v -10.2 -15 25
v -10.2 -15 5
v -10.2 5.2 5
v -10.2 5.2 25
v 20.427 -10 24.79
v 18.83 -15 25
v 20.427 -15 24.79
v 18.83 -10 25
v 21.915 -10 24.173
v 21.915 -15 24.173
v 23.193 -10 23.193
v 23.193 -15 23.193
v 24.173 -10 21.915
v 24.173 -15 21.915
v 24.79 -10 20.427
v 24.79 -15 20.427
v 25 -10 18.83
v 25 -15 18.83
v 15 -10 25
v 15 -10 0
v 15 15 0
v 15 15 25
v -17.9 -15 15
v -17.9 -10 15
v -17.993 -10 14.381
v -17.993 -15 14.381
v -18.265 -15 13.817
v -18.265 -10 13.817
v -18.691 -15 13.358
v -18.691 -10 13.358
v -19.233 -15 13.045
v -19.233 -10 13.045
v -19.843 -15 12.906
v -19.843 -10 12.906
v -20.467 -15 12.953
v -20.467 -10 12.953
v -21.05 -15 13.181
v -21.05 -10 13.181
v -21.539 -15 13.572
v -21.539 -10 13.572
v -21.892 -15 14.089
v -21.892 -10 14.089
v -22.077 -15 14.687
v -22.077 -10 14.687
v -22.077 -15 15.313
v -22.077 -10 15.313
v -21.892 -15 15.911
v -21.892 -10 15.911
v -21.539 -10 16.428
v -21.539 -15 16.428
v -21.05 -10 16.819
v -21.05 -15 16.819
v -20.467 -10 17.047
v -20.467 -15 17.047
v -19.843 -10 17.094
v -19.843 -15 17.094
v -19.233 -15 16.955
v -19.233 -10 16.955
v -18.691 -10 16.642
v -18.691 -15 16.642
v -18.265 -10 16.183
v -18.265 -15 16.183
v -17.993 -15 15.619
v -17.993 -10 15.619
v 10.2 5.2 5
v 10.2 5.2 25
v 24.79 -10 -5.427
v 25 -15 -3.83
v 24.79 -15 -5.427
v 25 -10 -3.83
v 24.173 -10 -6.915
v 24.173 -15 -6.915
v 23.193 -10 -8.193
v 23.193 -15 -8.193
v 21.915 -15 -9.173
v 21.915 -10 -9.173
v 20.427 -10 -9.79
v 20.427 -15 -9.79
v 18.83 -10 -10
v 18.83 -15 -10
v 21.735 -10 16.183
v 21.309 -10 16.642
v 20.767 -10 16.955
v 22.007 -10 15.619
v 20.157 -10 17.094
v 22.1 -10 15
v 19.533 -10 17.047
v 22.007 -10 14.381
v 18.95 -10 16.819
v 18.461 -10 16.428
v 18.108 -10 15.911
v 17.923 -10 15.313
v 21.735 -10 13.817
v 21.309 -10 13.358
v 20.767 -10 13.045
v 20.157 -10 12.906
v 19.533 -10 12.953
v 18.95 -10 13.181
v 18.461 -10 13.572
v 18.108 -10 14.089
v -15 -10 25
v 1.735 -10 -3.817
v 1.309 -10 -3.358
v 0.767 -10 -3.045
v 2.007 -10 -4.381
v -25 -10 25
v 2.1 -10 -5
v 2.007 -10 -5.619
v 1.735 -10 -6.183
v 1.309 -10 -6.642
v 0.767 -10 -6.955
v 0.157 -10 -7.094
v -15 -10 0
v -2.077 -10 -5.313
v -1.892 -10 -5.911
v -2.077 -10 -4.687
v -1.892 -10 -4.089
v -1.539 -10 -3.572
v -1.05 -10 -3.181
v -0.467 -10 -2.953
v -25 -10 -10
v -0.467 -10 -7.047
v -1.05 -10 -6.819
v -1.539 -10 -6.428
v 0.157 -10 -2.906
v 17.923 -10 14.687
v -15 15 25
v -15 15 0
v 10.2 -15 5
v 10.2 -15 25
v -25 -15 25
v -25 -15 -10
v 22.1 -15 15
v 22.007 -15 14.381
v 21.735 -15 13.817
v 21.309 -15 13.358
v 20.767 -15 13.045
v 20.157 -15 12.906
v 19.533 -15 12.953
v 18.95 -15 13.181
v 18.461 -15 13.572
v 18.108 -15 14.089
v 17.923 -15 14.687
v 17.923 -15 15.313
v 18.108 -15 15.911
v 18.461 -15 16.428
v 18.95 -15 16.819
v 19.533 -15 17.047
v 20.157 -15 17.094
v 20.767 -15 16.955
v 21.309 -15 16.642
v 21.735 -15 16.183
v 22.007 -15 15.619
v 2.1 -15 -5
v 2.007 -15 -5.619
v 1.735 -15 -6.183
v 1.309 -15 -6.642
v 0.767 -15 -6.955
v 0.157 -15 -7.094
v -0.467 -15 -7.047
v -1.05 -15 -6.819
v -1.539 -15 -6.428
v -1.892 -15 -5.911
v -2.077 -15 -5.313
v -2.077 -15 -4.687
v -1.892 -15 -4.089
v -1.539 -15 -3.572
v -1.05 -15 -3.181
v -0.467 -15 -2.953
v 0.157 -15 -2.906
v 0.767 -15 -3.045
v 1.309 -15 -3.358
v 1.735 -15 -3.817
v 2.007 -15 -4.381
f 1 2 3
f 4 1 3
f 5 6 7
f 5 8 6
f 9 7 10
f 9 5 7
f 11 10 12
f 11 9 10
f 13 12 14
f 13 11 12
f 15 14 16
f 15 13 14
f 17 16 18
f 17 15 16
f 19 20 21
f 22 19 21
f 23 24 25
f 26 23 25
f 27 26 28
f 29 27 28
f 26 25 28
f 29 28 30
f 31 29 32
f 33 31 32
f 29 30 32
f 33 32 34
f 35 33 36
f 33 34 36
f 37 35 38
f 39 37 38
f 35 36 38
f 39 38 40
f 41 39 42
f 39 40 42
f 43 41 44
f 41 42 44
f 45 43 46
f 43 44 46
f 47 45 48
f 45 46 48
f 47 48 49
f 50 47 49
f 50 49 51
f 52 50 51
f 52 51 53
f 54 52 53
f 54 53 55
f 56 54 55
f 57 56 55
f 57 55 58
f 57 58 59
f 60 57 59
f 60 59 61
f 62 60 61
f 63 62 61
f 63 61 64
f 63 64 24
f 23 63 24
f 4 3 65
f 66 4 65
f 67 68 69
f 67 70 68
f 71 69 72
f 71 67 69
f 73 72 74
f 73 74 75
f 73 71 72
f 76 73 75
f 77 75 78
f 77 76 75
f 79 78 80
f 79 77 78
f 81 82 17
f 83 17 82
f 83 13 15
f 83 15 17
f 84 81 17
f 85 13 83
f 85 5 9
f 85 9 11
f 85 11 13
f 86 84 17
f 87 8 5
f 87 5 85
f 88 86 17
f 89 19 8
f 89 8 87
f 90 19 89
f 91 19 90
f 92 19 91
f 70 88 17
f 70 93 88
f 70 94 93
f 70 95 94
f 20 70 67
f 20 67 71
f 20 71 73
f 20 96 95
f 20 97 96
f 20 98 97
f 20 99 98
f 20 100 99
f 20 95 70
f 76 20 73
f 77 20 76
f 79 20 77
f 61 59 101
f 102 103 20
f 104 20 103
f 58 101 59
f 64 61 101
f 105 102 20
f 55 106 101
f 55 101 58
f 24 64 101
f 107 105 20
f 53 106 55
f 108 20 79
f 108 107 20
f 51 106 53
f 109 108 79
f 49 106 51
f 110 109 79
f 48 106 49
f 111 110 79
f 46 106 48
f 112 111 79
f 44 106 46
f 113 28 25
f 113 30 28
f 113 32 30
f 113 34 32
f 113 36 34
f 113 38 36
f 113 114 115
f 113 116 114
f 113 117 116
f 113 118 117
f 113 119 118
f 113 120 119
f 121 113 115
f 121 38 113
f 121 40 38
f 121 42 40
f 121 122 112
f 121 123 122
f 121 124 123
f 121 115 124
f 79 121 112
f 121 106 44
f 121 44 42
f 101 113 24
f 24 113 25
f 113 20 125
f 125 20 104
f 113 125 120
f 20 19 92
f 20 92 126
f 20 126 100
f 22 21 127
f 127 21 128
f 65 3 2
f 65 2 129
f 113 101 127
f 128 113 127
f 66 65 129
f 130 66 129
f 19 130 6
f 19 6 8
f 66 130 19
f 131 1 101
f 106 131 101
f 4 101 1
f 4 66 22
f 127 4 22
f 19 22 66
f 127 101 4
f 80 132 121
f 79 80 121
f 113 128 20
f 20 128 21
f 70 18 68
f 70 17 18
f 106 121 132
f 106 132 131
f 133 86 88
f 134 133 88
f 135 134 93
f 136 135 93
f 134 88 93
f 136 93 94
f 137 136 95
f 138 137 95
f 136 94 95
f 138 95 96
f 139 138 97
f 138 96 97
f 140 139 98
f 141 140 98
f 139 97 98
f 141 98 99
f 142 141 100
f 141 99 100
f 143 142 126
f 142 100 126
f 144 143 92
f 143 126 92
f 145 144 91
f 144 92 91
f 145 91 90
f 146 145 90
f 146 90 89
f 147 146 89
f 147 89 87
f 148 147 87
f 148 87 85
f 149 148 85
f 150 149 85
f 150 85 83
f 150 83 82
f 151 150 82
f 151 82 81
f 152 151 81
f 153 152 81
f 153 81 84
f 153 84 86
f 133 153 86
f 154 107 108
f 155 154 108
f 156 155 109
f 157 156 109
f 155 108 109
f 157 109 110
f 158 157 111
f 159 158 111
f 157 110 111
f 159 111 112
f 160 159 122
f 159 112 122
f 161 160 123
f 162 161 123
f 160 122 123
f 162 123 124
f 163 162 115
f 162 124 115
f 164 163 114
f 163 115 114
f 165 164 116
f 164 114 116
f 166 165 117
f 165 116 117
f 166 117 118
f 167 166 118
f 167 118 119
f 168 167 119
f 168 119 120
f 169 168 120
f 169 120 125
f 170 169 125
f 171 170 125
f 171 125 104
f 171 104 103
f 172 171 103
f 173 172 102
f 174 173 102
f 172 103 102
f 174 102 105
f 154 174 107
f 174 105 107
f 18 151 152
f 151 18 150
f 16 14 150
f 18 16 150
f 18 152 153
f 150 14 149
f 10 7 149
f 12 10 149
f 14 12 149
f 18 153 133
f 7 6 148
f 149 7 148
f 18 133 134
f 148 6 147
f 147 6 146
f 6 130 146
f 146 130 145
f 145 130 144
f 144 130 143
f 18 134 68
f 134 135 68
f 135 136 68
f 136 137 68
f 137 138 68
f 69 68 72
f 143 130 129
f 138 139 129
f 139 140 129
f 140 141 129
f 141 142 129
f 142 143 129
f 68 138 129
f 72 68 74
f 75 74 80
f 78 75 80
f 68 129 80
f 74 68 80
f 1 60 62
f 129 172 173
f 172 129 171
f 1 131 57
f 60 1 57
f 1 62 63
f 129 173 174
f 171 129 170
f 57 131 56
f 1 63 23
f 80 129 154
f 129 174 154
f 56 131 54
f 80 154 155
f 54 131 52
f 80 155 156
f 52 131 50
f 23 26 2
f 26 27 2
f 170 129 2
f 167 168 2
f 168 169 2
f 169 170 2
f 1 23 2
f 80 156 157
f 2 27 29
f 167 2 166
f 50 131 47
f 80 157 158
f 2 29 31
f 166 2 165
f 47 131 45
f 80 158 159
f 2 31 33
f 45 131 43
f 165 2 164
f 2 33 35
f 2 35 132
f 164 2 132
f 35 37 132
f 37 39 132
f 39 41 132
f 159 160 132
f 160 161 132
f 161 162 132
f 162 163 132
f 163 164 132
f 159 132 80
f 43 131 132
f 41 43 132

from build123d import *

# Parameters (mm, degrees)
SKETCH_1_W          = 30
SKETCH_1_H          = 30
EXTRUDE_1_DEPTH     = 5
SKETCH_2_W          = 30
SKETCH_2_H          = 5
EXTRUDE_2_DEPTH     = 10
SKETCH_3_R          = 2.1
CUT_EXTRUDE_1_DEPTH = 5
EXTRUDE_3_DEPTH     = 20
SKETCH_5_W          = 35
SKETCH_5_H          = 5
EXTRUDE_4_DEPTH     = 10
SKETCH_6_W          = 35
SKETCH_6_H          = 5
EXTRUDE_5_DEPTH     = 10
SKETCH_7_R          = 2.1
CUT_EXTRUDE_2_DEPTH = 10
FILLET_1_R          = 6.17
FILLET_2_R          = 6.17


with BuildPart() as part:
    # 스케치1 → 보스-돌출1 (new body)
    with BuildSketch(Plane.XY):
        Rectangle(SKETCH_1_W, SKETCH_1_H)
    extrude(amount=EXTRUDE_1_DEPTH)

    # 스케치2 → 보스-돌출2 (add)
    with BuildSketch(Plane(origin=(0, 0, 0), x_dir=(-1, 0, 0), z_dir=(0, 0, -1))):
        with Locations((0, -12.5)):
            Rectangle(SKETCH_2_W, SKETCH_2_H)
    extrude(amount=EXTRUDE_2_DEPTH)

    # 스케치3 → 컷-돌출1 (cut)
    with BuildSketch(Plane(origin=(0, -10, 0), x_dir=(1, 0, 0), z_dir=(0, 1, 0))):
        with Locations((0, 5)):
            Circle(SKETCH_3_R)
    extrude(amount=-CUT_EXTRUDE_1_DEPTH, mode=Mode.SUBTRACT)

    # 스케치4 → 보스-돌출3 (add)
    with BuildSketch(Plane.XY.offset(5)):
        Polygon((10.2, -15), (15, -15), (15, 15), (-15, 15), (-15, -15), (-10.2, -15), (-10.2, 5.2), (10.2, 5.2), align=None)
    extrude(amount=EXTRUDE_3_DEPTH)

    # 스케치5 → 보스-돌출4 (add)
    with BuildSketch(Plane.ZY.offset(15)):
        with Locations((7.5, -12.5)):
            Rectangle(SKETCH_5_W, SKETCH_5_H)
    extrude(amount=EXTRUDE_4_DEPTH)

    # 스케치6 → 보스-돌출5 (add)
    with BuildSketch(Plane(origin=(15, 0, 0), x_dir=(0, 0, -1), z_dir=(1, 0, 0))):
        with Locations((-7.5, -12.5)):
            Rectangle(SKETCH_6_W, SKETCH_6_H)
    extrude(amount=EXTRUDE_5_DEPTH)

    # 스케치7 → 컷-돌출2 (cut)
    with BuildSketch(Plane(origin=(0, -10, 0), x_dir=(1, 0, 0), z_dir=(0, 1, 0))):
        with Locations((-20, -15)):
            Circle(SKETCH_7_R)
        with Locations((20, -15)):
            Circle(SKETCH_7_R)
    extrude(amount=-CUT_EXTRUDE_2_DEPTH, mode=Mode.SUBTRACT)

    # 필렛1
    fillet_1_edges = [part.edges().sort_by_distance(p)[0] for p in [
        (25, -12.5, 25),
    ]]
    fillet(fillet_1_edges, radius=FILLET_1_R)

    # 필렛2
    fillet_2_edges = [part.edges().sort_by_distance(p)[0] for p in [
        (25, -12.5, -10),
    ]]
    fillet(fillet_2_edges, radius=FILLET_2_R)


solid = part.part
